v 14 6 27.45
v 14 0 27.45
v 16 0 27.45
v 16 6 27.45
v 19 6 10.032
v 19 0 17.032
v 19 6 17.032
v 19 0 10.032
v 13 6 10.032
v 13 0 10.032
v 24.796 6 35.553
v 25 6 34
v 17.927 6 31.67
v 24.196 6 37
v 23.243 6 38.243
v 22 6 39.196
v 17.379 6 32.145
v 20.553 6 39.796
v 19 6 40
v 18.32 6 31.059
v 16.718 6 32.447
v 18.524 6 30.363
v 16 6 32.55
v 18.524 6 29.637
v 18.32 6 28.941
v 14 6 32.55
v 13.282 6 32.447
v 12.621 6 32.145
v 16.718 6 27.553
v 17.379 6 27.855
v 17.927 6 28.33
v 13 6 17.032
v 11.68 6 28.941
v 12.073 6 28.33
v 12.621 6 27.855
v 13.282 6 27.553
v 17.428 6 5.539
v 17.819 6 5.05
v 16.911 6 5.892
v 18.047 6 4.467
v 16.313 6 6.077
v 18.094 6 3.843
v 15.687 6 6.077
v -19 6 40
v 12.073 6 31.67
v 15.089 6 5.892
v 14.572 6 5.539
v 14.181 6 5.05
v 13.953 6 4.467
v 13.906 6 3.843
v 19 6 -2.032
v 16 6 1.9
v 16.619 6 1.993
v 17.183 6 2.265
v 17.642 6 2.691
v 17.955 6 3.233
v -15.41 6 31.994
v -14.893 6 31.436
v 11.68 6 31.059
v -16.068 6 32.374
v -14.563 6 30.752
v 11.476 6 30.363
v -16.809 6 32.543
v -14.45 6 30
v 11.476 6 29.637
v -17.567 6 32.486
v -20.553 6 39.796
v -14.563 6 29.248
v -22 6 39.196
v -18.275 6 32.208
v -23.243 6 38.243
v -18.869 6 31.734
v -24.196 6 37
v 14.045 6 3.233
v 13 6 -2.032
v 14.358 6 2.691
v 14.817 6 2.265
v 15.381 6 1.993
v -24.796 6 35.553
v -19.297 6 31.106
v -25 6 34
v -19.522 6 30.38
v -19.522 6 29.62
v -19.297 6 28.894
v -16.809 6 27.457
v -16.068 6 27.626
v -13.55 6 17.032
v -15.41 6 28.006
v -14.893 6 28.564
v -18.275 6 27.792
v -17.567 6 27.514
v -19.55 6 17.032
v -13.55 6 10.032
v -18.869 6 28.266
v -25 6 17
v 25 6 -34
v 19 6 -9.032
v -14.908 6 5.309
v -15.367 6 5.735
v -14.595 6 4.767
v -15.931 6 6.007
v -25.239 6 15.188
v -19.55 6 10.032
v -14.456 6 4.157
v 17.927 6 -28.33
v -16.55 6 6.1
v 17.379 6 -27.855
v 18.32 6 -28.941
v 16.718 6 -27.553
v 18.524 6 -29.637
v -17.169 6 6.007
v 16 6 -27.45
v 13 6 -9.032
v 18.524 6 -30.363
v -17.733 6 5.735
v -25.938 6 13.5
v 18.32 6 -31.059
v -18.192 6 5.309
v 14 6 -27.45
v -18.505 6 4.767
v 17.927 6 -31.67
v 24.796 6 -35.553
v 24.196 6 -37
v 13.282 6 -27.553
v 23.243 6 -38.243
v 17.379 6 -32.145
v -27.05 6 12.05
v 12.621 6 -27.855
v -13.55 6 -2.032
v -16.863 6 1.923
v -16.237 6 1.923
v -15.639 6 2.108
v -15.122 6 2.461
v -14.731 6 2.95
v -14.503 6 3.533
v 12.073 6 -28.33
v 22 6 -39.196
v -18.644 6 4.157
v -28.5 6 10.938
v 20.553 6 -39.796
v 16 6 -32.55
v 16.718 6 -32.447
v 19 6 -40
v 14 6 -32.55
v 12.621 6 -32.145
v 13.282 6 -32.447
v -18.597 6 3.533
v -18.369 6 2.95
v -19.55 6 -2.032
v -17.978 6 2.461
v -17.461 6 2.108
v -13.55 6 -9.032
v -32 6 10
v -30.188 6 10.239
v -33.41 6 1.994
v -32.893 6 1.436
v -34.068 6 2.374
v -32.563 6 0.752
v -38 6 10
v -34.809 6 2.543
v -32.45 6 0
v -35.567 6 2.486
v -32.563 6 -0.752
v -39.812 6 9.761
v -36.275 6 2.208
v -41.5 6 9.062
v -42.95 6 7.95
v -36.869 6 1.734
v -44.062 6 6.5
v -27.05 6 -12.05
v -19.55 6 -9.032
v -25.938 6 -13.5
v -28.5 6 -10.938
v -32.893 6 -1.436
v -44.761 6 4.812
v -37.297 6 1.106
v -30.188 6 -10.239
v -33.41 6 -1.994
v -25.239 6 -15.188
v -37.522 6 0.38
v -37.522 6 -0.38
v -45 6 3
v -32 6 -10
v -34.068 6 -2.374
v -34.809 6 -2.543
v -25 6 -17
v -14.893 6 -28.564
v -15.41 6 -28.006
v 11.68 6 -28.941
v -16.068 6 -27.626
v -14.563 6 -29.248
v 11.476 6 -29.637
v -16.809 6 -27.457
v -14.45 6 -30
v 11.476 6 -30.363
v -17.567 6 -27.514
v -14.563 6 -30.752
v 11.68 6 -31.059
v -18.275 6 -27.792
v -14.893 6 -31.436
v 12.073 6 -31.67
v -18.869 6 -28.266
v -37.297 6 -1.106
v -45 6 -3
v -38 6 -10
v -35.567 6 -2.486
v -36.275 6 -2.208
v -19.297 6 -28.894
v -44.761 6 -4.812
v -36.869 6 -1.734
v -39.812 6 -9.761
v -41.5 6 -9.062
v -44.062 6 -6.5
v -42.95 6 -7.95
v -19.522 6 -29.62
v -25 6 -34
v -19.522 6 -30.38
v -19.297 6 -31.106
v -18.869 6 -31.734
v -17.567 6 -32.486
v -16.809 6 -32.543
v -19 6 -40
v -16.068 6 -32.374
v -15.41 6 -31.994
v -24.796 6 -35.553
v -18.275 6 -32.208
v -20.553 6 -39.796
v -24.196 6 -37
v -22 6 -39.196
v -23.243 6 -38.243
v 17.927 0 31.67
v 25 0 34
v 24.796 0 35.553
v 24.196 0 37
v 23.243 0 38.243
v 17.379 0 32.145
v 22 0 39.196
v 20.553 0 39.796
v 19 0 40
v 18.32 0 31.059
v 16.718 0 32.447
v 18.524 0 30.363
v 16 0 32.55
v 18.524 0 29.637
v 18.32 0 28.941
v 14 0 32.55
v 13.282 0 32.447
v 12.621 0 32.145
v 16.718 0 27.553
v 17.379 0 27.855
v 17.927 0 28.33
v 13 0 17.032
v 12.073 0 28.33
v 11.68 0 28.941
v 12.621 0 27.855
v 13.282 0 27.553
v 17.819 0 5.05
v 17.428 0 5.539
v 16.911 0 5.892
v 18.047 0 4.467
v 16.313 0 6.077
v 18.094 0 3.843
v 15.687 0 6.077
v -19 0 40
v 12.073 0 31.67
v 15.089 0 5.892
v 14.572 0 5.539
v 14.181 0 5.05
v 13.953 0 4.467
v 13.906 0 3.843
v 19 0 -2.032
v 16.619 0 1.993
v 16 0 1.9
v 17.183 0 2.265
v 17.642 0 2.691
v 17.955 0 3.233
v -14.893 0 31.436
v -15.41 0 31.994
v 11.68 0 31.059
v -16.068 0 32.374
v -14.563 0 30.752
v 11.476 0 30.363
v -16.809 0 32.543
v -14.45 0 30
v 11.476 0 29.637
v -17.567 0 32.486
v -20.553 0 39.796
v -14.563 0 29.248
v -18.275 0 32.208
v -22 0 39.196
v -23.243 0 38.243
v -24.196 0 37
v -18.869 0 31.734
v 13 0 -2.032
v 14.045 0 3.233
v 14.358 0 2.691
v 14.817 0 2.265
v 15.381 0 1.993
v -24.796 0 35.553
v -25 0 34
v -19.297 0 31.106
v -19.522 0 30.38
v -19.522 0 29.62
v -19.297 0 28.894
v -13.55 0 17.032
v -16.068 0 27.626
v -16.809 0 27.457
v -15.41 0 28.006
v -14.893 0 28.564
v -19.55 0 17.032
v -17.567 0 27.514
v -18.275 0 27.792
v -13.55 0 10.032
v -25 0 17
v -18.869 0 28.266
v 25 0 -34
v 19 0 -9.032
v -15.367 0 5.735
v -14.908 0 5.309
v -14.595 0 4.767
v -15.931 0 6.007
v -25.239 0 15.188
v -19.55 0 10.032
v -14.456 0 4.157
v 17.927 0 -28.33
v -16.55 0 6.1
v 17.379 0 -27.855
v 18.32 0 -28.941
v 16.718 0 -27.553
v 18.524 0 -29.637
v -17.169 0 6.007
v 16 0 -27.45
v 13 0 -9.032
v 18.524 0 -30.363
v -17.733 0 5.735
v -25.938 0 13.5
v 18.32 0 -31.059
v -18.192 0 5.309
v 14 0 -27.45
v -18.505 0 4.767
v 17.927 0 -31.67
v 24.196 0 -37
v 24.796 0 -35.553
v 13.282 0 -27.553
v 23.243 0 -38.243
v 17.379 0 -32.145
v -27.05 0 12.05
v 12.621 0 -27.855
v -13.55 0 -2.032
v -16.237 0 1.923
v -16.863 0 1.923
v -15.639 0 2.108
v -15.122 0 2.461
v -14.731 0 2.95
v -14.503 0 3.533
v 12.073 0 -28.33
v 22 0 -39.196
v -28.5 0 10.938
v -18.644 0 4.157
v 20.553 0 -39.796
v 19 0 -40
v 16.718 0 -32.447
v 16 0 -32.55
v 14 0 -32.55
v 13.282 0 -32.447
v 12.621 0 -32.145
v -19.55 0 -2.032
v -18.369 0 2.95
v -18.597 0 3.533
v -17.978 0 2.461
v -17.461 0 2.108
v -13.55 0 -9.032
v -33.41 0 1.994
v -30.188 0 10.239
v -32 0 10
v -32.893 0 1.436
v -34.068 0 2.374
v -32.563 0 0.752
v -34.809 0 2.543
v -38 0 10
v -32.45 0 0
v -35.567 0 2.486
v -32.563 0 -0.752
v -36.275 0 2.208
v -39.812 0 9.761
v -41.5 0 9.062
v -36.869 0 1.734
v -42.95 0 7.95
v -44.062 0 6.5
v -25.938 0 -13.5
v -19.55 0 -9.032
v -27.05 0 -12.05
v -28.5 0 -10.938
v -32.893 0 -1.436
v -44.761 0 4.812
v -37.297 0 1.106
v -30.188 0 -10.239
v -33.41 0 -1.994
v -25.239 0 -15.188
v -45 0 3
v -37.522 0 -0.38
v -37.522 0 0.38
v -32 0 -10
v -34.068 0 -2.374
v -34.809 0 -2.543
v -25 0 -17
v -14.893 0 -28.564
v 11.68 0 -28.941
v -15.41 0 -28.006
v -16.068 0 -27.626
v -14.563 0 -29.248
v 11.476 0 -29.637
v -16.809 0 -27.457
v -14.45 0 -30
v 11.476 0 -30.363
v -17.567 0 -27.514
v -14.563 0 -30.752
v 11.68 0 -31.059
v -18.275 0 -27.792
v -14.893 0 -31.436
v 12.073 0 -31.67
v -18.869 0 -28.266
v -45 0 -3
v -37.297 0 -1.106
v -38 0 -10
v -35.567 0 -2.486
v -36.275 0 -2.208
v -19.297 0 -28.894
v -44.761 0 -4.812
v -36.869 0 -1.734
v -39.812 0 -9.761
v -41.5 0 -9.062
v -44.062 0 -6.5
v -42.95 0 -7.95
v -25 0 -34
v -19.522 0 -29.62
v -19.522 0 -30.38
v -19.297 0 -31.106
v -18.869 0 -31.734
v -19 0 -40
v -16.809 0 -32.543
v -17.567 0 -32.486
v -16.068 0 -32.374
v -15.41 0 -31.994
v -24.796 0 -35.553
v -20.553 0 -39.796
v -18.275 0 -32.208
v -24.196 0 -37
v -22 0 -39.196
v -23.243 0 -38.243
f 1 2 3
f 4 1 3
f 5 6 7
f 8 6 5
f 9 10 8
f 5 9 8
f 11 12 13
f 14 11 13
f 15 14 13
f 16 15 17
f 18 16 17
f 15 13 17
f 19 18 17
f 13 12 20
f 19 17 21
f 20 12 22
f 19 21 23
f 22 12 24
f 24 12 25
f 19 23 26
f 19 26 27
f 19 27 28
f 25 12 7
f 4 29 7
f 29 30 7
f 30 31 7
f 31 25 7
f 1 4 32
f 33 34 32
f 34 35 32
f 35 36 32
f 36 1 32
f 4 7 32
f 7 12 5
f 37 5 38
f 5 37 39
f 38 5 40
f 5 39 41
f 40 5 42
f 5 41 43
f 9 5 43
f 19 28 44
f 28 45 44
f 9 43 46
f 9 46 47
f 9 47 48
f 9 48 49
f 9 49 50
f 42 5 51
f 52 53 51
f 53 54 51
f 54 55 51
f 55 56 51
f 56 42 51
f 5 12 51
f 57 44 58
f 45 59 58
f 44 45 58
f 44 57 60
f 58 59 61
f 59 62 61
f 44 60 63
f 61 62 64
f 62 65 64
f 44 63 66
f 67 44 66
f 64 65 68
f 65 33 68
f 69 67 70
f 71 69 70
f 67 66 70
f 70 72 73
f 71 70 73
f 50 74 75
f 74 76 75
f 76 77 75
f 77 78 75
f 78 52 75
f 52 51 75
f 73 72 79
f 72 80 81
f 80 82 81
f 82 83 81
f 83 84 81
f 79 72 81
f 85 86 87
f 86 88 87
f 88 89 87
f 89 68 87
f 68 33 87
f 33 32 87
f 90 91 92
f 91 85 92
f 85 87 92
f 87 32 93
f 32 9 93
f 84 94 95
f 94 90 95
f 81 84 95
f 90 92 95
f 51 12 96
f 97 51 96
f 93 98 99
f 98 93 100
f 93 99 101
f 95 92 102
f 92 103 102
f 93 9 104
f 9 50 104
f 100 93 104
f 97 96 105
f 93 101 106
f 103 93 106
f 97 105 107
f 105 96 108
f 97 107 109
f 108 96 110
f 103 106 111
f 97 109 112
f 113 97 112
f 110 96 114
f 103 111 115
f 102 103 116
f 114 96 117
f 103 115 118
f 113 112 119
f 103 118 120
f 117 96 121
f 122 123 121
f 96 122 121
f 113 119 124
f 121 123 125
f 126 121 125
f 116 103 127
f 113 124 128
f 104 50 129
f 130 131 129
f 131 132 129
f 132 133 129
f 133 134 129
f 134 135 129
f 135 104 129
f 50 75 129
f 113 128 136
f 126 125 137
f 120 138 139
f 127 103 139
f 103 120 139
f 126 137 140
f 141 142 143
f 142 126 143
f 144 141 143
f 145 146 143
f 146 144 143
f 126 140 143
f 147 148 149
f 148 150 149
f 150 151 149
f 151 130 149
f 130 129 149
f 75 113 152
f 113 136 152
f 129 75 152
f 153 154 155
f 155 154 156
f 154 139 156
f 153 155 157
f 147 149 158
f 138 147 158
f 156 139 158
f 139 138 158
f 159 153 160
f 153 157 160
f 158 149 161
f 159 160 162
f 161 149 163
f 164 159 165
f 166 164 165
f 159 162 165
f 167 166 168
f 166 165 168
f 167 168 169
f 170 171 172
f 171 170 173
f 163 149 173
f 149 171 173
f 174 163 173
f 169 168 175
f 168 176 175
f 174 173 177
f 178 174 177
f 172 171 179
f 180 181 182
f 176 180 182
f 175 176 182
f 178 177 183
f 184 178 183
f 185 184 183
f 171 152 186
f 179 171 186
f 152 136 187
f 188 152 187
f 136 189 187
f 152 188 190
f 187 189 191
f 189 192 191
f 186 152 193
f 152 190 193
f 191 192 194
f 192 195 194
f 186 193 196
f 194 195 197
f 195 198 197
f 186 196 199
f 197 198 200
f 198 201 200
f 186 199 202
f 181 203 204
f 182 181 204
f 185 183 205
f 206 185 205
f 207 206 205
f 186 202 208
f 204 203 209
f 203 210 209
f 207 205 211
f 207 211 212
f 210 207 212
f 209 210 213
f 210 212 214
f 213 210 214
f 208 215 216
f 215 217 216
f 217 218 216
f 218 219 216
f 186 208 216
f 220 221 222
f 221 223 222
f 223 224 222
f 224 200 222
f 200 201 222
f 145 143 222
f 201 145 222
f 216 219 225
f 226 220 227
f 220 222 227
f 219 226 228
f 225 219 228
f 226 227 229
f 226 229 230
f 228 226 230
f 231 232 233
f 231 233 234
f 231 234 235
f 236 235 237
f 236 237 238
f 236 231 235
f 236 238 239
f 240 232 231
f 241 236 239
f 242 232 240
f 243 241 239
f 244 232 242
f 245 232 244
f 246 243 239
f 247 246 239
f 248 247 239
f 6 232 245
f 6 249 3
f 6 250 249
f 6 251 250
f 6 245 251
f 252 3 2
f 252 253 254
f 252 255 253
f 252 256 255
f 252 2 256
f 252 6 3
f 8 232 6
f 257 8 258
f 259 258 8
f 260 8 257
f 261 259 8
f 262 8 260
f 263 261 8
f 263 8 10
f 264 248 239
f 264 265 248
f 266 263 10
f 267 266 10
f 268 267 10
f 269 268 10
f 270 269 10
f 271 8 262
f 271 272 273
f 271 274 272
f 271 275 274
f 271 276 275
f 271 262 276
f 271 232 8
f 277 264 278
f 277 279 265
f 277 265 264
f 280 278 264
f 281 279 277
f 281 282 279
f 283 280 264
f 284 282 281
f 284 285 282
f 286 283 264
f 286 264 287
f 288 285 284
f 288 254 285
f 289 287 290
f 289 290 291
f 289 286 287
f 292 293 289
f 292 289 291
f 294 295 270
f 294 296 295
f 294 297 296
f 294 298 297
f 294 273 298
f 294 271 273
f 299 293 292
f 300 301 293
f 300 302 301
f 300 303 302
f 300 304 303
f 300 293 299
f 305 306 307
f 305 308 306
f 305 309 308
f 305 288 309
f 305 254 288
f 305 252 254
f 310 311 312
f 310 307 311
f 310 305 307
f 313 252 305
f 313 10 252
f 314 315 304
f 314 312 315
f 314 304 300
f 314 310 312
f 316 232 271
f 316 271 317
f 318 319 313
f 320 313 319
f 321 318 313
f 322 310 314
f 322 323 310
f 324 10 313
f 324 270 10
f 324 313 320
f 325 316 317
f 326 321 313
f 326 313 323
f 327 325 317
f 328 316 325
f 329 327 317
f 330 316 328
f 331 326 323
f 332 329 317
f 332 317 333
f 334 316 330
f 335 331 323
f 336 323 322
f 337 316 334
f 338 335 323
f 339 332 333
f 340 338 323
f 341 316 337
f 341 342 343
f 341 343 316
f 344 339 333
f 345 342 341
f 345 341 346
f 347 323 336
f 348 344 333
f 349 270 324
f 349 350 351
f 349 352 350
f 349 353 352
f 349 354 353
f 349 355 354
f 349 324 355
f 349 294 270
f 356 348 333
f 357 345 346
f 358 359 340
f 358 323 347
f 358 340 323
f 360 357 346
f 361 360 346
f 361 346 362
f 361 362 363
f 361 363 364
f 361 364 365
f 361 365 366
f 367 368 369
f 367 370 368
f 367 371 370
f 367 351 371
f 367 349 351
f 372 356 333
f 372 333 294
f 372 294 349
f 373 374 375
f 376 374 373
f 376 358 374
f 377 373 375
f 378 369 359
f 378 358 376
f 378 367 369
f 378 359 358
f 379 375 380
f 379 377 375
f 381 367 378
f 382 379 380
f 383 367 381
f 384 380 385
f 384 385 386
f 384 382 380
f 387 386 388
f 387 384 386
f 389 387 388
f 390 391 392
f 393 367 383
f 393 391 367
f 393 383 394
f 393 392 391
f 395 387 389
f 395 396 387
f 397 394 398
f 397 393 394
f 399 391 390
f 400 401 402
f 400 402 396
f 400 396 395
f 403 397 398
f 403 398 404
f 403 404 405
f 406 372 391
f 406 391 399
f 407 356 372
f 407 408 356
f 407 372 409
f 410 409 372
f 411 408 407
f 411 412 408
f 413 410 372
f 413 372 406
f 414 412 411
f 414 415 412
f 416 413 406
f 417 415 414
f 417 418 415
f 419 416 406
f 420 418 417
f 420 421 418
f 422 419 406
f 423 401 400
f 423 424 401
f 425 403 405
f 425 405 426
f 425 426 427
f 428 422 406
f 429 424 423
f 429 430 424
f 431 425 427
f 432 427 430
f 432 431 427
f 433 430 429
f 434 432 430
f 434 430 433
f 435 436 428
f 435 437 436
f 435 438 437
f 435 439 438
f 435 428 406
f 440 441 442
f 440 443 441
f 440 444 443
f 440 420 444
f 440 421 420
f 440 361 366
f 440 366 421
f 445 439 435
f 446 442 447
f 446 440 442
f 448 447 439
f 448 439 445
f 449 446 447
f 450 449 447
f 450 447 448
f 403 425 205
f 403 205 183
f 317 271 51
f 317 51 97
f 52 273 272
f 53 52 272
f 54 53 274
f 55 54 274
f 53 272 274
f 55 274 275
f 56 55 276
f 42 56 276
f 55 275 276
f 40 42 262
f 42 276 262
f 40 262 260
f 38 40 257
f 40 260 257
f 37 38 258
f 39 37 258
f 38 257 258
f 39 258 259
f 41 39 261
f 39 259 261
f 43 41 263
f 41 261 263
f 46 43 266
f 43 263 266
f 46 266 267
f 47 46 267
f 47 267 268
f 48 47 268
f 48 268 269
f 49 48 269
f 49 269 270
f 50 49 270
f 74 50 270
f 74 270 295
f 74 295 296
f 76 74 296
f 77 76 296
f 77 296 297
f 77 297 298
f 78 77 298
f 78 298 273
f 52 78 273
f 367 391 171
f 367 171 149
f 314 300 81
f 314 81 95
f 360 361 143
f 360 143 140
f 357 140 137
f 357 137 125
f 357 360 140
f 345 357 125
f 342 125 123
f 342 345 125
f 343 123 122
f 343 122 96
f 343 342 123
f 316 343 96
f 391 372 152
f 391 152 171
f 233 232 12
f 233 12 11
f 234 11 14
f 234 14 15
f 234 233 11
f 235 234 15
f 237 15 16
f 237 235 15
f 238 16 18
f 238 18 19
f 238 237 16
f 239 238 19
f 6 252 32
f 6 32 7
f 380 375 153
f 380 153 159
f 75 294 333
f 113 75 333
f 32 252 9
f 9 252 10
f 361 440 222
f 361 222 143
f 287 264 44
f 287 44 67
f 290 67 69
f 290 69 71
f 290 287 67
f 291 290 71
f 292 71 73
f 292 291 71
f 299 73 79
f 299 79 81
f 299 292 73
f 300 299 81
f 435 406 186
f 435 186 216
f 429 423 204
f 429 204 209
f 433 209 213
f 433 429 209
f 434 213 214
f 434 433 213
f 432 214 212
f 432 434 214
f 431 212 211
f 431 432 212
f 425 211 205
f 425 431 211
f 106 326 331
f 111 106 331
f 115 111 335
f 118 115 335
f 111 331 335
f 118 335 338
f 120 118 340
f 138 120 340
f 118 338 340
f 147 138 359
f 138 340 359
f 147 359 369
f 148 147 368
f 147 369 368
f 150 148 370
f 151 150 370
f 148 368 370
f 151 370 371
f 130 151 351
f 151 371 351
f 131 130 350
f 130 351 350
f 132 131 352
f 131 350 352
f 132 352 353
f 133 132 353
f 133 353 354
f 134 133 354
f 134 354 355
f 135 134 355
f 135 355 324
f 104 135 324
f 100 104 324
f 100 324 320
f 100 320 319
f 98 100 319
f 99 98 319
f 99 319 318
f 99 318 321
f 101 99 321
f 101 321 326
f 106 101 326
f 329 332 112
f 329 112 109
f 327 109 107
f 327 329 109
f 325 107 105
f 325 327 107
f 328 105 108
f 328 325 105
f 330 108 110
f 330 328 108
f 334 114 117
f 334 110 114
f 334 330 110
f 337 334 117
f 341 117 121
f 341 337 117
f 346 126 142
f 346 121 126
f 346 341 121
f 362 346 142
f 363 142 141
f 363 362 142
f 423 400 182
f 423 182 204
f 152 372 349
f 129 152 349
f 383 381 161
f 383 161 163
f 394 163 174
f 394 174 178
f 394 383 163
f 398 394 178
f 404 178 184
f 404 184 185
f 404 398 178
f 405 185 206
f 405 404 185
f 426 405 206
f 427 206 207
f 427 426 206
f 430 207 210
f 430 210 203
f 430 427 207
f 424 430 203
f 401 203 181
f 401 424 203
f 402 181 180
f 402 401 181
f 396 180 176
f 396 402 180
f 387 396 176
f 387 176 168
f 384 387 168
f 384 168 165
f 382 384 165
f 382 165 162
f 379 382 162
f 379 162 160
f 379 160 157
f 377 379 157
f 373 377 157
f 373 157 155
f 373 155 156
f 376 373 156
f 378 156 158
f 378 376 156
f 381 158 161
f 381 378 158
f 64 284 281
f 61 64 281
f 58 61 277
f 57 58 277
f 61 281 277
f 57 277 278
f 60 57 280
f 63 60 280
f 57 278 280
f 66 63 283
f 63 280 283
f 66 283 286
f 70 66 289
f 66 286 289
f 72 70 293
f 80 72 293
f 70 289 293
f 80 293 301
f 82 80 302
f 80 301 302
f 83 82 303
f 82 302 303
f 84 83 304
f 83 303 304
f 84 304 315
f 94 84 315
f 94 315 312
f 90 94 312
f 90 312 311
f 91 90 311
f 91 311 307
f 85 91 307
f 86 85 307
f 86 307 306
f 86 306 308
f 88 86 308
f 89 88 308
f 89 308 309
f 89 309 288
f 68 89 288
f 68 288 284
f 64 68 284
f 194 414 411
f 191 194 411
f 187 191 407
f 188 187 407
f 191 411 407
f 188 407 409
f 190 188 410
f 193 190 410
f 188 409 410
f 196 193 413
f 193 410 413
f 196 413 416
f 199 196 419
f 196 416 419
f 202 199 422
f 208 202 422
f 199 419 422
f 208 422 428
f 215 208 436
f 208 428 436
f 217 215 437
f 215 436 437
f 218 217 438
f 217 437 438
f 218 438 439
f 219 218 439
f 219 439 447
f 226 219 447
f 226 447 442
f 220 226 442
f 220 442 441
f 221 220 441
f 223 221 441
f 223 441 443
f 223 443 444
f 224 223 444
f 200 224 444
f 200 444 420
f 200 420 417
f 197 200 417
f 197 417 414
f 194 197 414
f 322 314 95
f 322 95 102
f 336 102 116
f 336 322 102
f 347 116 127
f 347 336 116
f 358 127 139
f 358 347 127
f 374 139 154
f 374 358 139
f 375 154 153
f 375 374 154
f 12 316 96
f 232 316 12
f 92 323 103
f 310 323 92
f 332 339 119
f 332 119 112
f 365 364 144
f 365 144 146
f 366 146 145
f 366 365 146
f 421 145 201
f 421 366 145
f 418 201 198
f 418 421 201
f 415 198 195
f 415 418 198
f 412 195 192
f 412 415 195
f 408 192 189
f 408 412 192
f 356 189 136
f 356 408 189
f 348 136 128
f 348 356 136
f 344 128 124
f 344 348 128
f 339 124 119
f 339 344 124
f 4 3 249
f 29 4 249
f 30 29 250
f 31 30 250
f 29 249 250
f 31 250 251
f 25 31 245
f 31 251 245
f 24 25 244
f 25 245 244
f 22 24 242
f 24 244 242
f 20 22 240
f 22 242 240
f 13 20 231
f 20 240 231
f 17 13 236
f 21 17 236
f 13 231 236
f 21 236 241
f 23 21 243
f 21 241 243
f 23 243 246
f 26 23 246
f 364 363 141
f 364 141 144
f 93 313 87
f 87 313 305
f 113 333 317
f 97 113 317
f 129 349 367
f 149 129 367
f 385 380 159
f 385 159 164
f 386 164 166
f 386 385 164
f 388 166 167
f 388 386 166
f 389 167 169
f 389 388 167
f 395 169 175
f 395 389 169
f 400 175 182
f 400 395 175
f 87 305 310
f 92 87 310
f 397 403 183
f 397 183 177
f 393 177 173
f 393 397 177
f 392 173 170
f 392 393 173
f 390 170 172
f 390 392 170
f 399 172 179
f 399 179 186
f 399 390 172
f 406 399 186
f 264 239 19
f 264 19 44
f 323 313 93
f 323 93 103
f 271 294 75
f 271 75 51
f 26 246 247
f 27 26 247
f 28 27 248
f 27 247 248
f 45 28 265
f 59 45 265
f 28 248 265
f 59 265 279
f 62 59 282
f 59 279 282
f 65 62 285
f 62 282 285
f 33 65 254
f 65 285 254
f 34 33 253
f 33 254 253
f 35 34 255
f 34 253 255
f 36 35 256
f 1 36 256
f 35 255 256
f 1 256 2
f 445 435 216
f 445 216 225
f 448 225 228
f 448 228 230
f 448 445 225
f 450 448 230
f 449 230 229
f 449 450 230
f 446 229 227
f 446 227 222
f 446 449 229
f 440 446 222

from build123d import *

# Parameters (mm, degrees)
SKETCH_1_R           = 2.55
EXTRUDE_1_DEPTH      = 6
SKETCH_2_R           = 2.55
CUT_EXTRUDE_1_DEPTH  = 7
SKETCH_3_R           = 2.1
SKETCH_3_W           = 7
SKETCH_3_H           = 6
CUT_EXTRUDE_11_DEPTH = 7
SKETCH_31_R          = 2.1
SKETCH_31_W          = 7
SKETCH_31_H          = 6
CUT_EXTRUDE_12_DEPTH = 7


with BuildPart() as part:
    # Эскиз1 → Бобышка-Вытянуть1 (new body)
    with BuildSketch(Plane(origin=(0, 0, 0), x_dir=(1, 0, 0), z_dir=(0, 1, 0))):
        with BuildLine():
            Line((-32, -10), (-38, -10))
            ThreePointArc((-38, -10), (-42.949747468, -7.949747468), (-45, -3))
            Line((-45, -3), (-45, 3))
            ThreePointArc((-45, 3), (-42.949747468, 7.949747468), (-38, 10))
            Line((-38, 10), (-32, 10))
            ThreePointArc((-32, 10), (-27.050252532, 12.050252532), (-25, 17))
            Line((-25, 17), (-25, 34))
            ThreePointArc((-25, 34), (-23.242640687, 38.242640687), (-19, 40))
            Line((-19, 40), (19, 40))
            ThreePointArc((19, 40), (23.242640687, 38.242640687), (25, 34))
            Line((25, 34), (25, -34))
            ThreePointArc((25, -34), (23.242640687, -38.242640687), (19, -40))
            Line((19, -40), (-19, -40))
            ThreePointArc((-19, -40), (-23.242640687, -38.242640687), (-25, -34))
            Line((-25, -34), (-25, -17))
            ThreePointArc((-25, -17), (-27.050252532, -12.050252532), (-32, -10))
        make_face()
        with Locations((-35, 0)):
            Circle(SKETCH_1_R, mode=Mode.SUBTRACT)
    extrude(amount=EXTRUDE_1_DEPTH)

    # Эскиз2 → Вырез-Вытянуть1 (cut, through all)
    with BuildSketch(Plane.XZ):
        with Locations((-17, -30)):
            Circle(SKETCH_2_R)
        with Locations((-17, 30)):
            Circle(SKETCH_2_R)
        with BuildLine():
            Line((16, -32.55), (14, -32.55))
            ThreePointArc((14, -32.55), (11.45, -30), (14, -27.45))
            Line((14, -27.45), (16, -27.45))
            ThreePointArc((16, -27.45), (18.55, -30), (16, -32.55))
        make_face()
        with BuildLine():
            Line((16, 32.55), (14, 32.55))
            ThreePointArc((14, 32.55), (11.45, 30), (14, 27.45))
            Line((14, 27.45), (16, 27.45))
            ThreePointArc((16, 27.45), (18.55, 30), (16, 32.55))
        make_face()
    extrude(amount=-CUT_EXTRUDE_1_DEPTH, mode=Mode.SUBTRACT)

    # Эскиз3 → Вырез-Вытянуть11 (cut, through all)
    with BuildSketch(Plane(origin=(-31, 0, 4), x_dir=(0, 0, -1), z_dir=(0, -1, 0))):
        with Locations((0, 47)):
            Circle(SKETCH_3_R)
        with Locations((9.531849908, 47)):
            Rectangle(SKETCH_3_W, SKETCH_3_H)
        with Locations((-9.531849908, 47)):
            Rectangle(SKETCH_3_W, SKETCH_3_H)
    extrude(amount=-CUT_EXTRUDE_11_DEPTH, mode=Mode.SUBTRACT)

    # Эскиз31 → Вырез-Вытянуть12 (cut, through all)
    with BuildSketch(Plane(origin=(30.45, 0, 4), x_dir=(0, 0, 1), z_dir=(0, -1, 0))):
        with Locations((0, 47)):
            Circle(SKETCH_31_R)
        with Locations((9.531849908, 47)):
            Rectangle(SKETCH_31_W, SKETCH_31_H)
        with Locations((-9.531849908, 47)):
            Rectangle(SKETCH_31_W, SKETCH_31_H)
    extrude(amount=-CUT_EXTRUDE_12_DEPTH, mode=Mode.SUBTRACT)


solid = part.part
